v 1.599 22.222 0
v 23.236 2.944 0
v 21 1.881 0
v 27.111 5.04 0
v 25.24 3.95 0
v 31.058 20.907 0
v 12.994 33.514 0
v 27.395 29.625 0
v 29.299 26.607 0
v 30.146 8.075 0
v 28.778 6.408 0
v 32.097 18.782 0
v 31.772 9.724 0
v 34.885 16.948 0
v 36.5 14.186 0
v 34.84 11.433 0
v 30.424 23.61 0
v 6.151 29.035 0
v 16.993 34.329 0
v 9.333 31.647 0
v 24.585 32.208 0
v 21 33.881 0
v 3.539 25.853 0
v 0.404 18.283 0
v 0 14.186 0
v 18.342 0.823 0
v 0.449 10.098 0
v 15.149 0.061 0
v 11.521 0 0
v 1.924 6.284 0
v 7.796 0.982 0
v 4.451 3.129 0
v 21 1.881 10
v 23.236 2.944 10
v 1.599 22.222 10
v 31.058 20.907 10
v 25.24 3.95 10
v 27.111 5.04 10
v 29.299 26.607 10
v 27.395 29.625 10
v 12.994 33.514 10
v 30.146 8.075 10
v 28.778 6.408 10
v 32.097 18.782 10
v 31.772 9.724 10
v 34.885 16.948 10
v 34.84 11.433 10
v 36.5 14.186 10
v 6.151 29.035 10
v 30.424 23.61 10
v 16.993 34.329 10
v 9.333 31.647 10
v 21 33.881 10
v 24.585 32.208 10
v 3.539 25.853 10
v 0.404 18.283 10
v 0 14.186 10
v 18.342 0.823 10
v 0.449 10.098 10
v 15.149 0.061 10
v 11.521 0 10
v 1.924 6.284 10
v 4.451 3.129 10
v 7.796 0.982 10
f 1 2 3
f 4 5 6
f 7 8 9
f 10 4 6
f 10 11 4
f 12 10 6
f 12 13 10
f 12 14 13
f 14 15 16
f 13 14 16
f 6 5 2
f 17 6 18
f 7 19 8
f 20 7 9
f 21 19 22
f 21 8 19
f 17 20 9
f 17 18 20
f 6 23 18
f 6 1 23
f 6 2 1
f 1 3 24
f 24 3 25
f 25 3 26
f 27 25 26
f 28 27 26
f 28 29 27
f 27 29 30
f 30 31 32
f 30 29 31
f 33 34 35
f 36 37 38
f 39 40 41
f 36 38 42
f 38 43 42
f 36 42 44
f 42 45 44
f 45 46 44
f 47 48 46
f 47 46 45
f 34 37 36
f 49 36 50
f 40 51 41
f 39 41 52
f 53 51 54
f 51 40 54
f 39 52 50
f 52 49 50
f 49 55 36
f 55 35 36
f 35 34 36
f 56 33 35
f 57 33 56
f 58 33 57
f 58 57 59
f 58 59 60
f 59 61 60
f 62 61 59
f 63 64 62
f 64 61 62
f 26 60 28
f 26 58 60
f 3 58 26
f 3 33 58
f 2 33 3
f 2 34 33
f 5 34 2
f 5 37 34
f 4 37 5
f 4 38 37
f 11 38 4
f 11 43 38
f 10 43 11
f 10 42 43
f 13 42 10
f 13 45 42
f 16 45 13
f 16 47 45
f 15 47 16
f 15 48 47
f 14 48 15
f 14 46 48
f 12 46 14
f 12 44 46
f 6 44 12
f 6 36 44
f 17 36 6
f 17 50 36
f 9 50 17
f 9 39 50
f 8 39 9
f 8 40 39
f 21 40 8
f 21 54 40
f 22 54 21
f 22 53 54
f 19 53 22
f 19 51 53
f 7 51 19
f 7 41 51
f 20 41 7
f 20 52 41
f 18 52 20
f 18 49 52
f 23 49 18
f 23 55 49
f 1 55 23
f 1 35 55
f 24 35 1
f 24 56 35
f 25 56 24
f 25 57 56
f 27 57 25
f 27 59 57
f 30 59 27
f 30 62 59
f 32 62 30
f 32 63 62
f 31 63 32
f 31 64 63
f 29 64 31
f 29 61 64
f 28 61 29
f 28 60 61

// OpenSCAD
$fn = 32;

// ----------------------------------------------------------------------
// Cam disc: base radius 11.0 mm, lift 10.0 mm, 32 profile points
// ----------------------------------------------------------------------

// --- parameters (mm) ---
profile_height = 10;      // extrusion height
profile_points = 32;      // points of the closed outline

profile = [[36.5, 14.186], [34.885, 16.948], [32.097, 18.782], [31.058, 20.907], [30.424, 23.61], [29.299, 26.607], [27.395, 29.625], [24.585, 32.208], [21, 33.881], [16.993, 34.329], [12.994, 33.514], [9.333, 31.647], [6.151, 29.035], [3.539, 25.853], [1.599, 22.222], [0.404, 18.283], [0, 14.186], [0.449, 10.098], [1.924, 6.284], [4.451, 3.129], [7.796, 0.982], [11.521, 0], [15.149, 0.061], [18.342, 0.823], [21, 1.881], [23.236, 2.944], [25.24, 3.95], [27.111, 5.04], [28.778, 6.408], [30.146, 8.075], [31.772, 9.724], [34.84, 11.433]];  // single closed polygon, 32 points, counter clockwise

// --- the one profile operation ---
linear_extrude(height = profile_height) polygon(points = profile);
